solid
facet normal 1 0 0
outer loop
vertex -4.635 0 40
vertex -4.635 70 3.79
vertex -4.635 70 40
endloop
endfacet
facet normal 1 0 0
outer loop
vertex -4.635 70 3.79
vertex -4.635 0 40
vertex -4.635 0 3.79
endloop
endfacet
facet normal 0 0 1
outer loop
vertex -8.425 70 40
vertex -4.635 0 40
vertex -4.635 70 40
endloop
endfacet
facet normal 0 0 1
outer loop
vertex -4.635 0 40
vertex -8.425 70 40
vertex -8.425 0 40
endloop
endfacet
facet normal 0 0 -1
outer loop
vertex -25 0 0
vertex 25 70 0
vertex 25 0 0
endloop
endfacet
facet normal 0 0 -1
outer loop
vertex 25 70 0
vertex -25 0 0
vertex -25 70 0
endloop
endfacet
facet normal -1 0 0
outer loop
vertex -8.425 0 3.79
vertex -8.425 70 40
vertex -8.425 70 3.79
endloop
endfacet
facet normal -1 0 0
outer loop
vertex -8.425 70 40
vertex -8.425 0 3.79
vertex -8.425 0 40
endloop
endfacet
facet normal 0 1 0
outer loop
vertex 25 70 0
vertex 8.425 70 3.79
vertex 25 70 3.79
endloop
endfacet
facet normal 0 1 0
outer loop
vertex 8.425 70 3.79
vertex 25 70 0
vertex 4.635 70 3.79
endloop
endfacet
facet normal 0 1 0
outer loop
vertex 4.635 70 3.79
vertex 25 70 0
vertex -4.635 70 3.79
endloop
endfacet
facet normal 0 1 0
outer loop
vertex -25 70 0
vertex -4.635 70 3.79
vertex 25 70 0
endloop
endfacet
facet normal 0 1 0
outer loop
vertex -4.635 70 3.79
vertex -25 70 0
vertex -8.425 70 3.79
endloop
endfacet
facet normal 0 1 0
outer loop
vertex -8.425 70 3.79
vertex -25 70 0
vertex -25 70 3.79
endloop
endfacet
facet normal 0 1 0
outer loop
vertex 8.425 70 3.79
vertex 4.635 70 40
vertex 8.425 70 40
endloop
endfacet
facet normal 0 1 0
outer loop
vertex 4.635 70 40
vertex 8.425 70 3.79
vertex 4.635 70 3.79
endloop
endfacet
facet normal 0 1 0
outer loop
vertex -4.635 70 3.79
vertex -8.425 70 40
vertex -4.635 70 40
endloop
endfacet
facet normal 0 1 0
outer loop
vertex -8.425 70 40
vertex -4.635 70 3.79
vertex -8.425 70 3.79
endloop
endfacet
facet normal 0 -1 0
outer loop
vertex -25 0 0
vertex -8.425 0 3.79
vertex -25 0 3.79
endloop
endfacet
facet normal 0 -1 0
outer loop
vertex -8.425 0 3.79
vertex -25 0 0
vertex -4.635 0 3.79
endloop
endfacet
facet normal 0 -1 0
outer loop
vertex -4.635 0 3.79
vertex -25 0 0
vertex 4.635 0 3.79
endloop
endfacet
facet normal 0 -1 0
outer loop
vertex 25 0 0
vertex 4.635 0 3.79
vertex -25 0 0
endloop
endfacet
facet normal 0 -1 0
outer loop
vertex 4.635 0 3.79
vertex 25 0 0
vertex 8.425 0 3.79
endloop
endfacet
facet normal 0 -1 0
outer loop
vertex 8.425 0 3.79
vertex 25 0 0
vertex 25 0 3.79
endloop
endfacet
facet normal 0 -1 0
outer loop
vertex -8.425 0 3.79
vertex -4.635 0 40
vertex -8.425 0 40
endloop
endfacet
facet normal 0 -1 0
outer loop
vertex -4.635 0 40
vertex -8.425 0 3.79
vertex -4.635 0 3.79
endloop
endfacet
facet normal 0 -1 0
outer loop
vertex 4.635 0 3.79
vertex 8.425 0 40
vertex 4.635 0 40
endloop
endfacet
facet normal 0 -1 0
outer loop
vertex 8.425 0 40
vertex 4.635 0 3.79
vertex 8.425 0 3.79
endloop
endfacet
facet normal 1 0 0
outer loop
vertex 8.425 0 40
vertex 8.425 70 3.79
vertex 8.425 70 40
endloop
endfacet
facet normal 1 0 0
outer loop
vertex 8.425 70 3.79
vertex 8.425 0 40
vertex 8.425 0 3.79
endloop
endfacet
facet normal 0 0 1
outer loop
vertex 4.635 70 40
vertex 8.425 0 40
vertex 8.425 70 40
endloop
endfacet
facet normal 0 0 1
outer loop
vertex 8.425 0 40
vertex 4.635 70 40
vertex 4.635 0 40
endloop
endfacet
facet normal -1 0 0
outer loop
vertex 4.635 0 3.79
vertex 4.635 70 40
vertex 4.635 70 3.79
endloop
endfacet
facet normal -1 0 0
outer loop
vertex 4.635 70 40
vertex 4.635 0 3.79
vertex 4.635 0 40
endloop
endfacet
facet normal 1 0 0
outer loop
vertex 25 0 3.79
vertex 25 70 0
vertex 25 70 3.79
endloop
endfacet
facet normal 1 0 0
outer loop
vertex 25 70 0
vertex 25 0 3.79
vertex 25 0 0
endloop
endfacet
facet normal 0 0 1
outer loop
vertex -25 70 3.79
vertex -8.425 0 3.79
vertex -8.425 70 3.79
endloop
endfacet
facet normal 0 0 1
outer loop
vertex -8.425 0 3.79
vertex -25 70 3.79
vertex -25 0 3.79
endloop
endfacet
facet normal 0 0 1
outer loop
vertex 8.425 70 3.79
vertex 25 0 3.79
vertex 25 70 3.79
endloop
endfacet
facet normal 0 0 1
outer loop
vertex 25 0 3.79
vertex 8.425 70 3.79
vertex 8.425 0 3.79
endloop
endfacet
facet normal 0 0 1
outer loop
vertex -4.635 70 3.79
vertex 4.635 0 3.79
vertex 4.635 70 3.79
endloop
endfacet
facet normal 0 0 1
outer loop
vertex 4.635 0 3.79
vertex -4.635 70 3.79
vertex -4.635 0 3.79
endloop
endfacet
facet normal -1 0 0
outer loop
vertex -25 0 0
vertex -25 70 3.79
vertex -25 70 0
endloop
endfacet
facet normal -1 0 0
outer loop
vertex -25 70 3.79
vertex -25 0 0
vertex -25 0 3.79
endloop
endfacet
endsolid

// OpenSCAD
//Huion Holder

//Minimale Breite
m=9*1.03;
//Width
w=70;
//Thickness
t=3.79; //9 Lines PrusaSlicer
//Height
h=40;
//Breite
b=50;

module walls()
{
    translate([-t-m/2,0,0])
    {
        cube([t,w,h]);

        translate([m+t,0,0])
        cube([t,w,h]);
    }
}

walls();

translate([-b/2,0,0])
cube([b,w,t]);
